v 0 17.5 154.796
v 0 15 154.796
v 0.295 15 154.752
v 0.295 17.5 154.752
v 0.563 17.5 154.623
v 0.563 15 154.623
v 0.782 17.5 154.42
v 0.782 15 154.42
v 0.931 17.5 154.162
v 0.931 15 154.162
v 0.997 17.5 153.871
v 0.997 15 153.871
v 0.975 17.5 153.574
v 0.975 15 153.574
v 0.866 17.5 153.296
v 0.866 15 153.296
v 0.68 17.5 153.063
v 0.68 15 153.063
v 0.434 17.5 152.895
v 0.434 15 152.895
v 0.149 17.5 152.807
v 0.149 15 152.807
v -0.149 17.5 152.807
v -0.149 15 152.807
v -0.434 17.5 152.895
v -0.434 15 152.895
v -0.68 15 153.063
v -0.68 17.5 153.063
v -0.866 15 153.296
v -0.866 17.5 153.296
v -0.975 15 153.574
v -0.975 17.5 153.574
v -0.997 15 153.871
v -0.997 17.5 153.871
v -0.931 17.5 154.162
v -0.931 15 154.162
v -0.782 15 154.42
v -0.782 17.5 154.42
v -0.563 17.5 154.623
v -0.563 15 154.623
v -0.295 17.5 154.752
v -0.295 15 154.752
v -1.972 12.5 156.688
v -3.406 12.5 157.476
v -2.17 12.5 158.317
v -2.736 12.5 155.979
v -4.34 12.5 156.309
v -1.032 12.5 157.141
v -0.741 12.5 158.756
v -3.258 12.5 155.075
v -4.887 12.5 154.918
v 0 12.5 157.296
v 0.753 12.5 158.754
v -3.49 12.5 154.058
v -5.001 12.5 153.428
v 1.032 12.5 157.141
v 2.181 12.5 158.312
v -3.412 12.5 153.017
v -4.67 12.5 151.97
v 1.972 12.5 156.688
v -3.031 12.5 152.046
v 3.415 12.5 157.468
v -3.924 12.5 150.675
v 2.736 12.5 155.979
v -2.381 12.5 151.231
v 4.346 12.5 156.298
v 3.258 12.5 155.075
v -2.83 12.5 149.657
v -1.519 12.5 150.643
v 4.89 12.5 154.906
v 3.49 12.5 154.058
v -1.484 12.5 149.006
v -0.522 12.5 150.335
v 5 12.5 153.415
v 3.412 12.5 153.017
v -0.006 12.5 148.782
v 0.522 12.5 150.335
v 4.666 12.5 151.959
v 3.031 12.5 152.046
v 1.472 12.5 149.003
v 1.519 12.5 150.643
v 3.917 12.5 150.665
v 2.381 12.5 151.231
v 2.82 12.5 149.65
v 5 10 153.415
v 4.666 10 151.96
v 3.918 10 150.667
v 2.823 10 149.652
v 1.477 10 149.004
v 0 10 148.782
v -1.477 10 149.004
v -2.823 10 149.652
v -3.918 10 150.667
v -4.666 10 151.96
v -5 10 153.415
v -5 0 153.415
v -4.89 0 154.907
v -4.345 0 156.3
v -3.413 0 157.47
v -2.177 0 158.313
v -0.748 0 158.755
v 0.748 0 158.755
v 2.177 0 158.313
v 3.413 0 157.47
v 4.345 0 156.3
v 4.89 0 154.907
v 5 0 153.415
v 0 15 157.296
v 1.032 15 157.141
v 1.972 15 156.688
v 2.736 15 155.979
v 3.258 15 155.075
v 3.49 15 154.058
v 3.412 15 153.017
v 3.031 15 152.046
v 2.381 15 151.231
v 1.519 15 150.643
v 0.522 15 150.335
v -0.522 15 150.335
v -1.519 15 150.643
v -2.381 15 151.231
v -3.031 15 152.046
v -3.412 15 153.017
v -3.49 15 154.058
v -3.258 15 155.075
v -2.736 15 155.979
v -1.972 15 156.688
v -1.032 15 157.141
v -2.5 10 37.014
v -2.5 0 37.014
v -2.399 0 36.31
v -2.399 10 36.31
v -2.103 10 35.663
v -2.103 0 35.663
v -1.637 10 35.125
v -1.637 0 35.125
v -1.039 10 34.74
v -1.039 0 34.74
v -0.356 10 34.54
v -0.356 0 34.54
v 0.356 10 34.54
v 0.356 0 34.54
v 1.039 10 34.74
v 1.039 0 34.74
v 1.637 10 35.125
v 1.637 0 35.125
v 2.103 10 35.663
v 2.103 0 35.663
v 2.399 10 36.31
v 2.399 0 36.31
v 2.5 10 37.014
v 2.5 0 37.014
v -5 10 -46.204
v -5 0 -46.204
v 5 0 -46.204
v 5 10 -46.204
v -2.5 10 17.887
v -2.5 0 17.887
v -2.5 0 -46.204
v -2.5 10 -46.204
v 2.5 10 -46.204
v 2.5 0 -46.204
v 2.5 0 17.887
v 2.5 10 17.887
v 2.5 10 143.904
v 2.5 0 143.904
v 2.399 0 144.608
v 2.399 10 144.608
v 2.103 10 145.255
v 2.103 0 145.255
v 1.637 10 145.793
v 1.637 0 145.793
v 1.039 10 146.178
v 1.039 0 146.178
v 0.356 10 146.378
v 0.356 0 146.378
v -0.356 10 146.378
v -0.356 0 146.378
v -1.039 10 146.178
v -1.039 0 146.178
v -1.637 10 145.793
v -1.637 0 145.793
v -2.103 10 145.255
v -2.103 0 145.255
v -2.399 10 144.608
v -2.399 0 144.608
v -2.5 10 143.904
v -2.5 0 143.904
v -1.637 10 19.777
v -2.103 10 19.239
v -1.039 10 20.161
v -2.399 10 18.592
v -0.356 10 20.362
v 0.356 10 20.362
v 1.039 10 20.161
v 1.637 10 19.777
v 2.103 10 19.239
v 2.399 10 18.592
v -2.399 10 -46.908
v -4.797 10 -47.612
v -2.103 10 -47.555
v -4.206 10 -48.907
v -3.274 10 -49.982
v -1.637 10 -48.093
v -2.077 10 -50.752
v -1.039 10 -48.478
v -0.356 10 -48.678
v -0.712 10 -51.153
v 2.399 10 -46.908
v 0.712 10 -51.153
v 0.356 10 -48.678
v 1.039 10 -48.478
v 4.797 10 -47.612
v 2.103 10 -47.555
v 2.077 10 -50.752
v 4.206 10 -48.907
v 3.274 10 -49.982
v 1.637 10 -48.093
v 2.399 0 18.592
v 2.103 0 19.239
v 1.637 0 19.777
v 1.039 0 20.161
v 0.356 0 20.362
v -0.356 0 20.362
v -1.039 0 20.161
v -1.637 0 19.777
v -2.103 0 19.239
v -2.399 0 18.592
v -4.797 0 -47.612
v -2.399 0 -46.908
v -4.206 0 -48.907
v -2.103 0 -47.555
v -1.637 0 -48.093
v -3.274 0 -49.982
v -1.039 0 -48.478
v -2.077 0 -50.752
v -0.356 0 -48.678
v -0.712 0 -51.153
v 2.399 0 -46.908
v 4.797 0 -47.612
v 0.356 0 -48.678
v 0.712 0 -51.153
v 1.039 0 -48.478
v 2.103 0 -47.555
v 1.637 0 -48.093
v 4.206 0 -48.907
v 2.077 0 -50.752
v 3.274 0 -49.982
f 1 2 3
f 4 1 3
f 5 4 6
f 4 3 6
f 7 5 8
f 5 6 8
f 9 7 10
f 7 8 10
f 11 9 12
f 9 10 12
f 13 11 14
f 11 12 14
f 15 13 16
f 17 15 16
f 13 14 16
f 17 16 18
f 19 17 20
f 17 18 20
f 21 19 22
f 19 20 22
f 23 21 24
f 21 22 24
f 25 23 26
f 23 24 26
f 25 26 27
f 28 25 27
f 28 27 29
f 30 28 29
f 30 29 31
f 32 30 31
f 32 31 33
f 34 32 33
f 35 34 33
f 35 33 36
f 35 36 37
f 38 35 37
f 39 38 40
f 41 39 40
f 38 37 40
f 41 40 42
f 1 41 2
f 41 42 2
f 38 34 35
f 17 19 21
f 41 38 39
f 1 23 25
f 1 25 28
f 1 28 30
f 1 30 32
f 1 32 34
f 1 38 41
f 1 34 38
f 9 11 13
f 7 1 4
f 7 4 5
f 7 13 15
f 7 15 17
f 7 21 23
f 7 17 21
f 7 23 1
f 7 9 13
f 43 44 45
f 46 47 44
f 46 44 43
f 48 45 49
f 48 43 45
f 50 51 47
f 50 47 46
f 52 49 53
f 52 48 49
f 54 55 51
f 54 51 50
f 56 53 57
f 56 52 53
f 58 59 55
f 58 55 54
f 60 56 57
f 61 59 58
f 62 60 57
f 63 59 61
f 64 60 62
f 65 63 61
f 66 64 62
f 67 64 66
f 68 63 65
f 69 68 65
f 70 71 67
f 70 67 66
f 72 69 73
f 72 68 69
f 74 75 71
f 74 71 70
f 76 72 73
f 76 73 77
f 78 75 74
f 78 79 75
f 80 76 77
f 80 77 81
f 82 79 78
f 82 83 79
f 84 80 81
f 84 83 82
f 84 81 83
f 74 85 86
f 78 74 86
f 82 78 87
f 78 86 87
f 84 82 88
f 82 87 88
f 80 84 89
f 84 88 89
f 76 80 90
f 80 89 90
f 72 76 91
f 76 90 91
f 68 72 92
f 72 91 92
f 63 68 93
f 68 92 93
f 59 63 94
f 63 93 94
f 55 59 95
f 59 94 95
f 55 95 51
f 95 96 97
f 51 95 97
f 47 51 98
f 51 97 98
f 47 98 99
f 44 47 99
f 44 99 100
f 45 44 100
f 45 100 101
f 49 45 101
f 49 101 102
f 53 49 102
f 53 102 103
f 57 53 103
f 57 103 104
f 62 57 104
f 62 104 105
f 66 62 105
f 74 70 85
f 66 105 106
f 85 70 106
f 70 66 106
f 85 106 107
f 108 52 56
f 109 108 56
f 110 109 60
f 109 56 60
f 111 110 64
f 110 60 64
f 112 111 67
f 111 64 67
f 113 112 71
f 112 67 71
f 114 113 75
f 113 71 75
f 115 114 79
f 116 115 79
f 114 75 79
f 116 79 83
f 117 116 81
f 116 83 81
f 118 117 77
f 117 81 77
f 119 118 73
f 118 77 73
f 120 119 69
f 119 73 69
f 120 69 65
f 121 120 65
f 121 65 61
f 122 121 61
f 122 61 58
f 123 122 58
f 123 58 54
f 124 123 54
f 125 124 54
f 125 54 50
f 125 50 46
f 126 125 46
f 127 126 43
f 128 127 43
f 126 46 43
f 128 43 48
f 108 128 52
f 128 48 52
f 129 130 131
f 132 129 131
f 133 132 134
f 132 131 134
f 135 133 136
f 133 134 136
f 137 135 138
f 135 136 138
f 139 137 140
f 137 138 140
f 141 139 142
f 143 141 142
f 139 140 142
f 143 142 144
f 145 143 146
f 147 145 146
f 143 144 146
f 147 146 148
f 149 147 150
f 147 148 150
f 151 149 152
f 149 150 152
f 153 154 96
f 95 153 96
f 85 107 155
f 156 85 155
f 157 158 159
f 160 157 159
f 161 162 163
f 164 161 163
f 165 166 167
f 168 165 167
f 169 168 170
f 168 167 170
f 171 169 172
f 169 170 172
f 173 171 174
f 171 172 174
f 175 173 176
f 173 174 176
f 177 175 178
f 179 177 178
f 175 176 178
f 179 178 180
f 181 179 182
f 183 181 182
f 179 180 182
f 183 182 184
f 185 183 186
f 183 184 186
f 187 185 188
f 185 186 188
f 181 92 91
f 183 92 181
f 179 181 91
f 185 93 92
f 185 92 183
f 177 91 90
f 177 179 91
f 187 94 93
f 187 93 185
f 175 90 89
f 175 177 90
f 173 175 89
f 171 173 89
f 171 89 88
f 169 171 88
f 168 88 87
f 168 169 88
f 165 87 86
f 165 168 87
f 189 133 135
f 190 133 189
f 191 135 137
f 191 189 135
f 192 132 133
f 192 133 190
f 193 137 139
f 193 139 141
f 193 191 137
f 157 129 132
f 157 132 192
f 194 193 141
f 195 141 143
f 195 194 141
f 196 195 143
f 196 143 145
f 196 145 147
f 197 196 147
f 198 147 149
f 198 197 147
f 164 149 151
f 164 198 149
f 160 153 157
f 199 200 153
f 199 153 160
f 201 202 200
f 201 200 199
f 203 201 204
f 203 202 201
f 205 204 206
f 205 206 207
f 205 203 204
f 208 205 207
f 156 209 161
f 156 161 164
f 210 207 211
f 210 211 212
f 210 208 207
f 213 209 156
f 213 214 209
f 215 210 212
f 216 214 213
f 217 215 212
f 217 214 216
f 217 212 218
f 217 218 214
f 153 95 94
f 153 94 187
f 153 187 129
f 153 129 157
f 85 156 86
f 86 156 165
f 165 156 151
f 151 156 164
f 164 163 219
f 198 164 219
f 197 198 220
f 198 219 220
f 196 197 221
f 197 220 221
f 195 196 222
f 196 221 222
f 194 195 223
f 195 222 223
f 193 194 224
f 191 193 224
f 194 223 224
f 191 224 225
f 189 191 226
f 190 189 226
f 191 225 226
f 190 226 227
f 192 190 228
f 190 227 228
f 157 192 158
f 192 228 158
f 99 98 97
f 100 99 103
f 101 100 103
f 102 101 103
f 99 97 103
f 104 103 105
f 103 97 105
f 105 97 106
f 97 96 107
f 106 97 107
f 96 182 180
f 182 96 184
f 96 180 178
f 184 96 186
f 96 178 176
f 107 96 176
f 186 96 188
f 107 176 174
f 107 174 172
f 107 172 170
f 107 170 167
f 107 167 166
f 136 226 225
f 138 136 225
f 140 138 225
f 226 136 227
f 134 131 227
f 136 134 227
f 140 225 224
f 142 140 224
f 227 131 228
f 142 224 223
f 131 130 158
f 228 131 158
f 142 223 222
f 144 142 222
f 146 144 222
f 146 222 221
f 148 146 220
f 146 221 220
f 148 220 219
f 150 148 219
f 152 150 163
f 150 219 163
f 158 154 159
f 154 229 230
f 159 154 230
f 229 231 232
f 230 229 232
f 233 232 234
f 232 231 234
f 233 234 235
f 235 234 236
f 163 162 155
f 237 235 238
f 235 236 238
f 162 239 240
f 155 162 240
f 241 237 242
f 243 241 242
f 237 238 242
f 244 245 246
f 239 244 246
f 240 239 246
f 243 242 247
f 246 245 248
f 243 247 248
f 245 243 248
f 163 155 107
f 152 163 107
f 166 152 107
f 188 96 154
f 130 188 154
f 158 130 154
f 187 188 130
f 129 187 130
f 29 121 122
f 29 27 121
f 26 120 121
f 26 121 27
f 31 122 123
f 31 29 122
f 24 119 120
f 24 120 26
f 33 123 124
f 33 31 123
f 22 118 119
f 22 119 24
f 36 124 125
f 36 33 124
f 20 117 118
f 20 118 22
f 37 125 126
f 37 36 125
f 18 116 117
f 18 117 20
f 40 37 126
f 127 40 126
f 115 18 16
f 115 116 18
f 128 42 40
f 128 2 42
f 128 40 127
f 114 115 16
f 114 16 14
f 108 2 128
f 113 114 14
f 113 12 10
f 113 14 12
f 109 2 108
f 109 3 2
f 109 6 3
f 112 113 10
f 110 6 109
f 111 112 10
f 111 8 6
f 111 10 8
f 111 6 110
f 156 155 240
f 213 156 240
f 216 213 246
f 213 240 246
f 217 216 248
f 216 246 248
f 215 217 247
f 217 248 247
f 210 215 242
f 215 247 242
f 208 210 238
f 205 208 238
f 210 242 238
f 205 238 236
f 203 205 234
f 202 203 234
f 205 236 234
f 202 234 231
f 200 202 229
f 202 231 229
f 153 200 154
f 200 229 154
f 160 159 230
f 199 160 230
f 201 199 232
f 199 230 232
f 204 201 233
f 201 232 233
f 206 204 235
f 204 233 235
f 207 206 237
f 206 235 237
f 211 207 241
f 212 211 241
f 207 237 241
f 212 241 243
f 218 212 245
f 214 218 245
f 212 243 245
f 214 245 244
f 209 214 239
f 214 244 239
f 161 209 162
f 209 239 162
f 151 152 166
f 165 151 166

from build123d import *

# Parameters (mm, degrees)
BOSS_EXTRUDE7_DEPTH  = 10
BOSS_EXTRUDE8_DEPTH  = 12.5
SKETCH2_R            = 3.5
BOSS_EXTRUDE9_DEPTH  = 2.5
SKETCH3_R            = 1
BOSS_EXTRUDE10_DEPTH = 2.5


with BuildPart() as part:
    # Sketch1 → Boss-Extrude7 (new body)
    with BuildSketch(Plane(origin=(0, 0, 0), x_dir=(1, 0, 0), z_dir=(0, 1, 0))):
        with BuildLine():
            Line((-5, 46.203703704), (-5, -153.415497967))
            ThreePointArc((-5, -153.415497967), (0, -148.781816526), (5, -153.415497967))
            Line((5, -153.415497967), (5, 46.203703704))
            ThreePointArc((5, 46.203703704), (0, 51.203703704), (-5, 46.203703704))
        make_face()
        with BuildLine():
            ThreePointArc((-2.5, -37.014405443), (0, -34.514405443), (2.5, -37.014405443))
            Line((2.5, -37.014405443), (2.5, -143.90389726))
            ThreePointArc((2.5, -143.90389726), (0, -146.40389726), (-2.5, -143.90389726))
            Line((-2.5, -143.90389726), (-2.5, -37.014405443))
        make_face(mode=Mode.SUBTRACT)
        with BuildLine():
            ThreePointArc((-2.5, 46.203703704), (0, 48.703703704), (2.5, 46.203703704))
            Line((2.5, 46.203703704), (2.5, -17.887410681))
            ThreePointArc((2.5, -17.887410681), (0, -20.387410681), (-2.5, -17.887410681))
            Line((-2.5, -17.887410681), (-2.5, 46.203703704))
        make_face(mode=Mode.SUBTRACT)
    extrude(amount=BOSS_EXTRUDE7_DEPTH)

    # Sketch1<11> → Boss-Extrude8 (add)
    with BuildSketch(Plane(origin=(0, 0, 0), x_dir=(1, 0, 0), z_dir=(0, 1, 0))):
        with BuildLine():
            ThreePointArc((5, -153.415497967), (0, -148.781816526), (-5, -153.415497967))
            ThreePointArc((-5, -153.415497967), (-0.190536762, -158.807154817), (5.01447977, -153.796296296))
            ThreePointArc((5.01447977, -153.796296296), (5.01085852, -153.605759534), (5, -153.415497967))
        make_face()
    extrude(amount=BOSS_EXTRUDE8_DEPTH)

    # Sketch2 → Boss-Extrude9 (add)
    with BuildSketch(Plane(origin=(0, 12.5, 0), x_dir=(1, 0, 0), z_dir=(0, 1, 0))):
        with Locations((0, -153.796296296)):
            Circle(SKETCH2_R)
    extrude(amount=BOSS_EXTRUDE9_DEPTH)

    # Sketch3 → Boss-Extrude10 (add)
    with BuildSketch(Plane(origin=(0, 15, 0), x_dir=(1, 0, 0), z_dir=(0, 1, 0))):
        with Locations((0, -153.796296296)):
            Circle(SKETCH3_R)
    extrude(amount=BOSS_EXTRUDE10_DEPTH)


solid = part.part
